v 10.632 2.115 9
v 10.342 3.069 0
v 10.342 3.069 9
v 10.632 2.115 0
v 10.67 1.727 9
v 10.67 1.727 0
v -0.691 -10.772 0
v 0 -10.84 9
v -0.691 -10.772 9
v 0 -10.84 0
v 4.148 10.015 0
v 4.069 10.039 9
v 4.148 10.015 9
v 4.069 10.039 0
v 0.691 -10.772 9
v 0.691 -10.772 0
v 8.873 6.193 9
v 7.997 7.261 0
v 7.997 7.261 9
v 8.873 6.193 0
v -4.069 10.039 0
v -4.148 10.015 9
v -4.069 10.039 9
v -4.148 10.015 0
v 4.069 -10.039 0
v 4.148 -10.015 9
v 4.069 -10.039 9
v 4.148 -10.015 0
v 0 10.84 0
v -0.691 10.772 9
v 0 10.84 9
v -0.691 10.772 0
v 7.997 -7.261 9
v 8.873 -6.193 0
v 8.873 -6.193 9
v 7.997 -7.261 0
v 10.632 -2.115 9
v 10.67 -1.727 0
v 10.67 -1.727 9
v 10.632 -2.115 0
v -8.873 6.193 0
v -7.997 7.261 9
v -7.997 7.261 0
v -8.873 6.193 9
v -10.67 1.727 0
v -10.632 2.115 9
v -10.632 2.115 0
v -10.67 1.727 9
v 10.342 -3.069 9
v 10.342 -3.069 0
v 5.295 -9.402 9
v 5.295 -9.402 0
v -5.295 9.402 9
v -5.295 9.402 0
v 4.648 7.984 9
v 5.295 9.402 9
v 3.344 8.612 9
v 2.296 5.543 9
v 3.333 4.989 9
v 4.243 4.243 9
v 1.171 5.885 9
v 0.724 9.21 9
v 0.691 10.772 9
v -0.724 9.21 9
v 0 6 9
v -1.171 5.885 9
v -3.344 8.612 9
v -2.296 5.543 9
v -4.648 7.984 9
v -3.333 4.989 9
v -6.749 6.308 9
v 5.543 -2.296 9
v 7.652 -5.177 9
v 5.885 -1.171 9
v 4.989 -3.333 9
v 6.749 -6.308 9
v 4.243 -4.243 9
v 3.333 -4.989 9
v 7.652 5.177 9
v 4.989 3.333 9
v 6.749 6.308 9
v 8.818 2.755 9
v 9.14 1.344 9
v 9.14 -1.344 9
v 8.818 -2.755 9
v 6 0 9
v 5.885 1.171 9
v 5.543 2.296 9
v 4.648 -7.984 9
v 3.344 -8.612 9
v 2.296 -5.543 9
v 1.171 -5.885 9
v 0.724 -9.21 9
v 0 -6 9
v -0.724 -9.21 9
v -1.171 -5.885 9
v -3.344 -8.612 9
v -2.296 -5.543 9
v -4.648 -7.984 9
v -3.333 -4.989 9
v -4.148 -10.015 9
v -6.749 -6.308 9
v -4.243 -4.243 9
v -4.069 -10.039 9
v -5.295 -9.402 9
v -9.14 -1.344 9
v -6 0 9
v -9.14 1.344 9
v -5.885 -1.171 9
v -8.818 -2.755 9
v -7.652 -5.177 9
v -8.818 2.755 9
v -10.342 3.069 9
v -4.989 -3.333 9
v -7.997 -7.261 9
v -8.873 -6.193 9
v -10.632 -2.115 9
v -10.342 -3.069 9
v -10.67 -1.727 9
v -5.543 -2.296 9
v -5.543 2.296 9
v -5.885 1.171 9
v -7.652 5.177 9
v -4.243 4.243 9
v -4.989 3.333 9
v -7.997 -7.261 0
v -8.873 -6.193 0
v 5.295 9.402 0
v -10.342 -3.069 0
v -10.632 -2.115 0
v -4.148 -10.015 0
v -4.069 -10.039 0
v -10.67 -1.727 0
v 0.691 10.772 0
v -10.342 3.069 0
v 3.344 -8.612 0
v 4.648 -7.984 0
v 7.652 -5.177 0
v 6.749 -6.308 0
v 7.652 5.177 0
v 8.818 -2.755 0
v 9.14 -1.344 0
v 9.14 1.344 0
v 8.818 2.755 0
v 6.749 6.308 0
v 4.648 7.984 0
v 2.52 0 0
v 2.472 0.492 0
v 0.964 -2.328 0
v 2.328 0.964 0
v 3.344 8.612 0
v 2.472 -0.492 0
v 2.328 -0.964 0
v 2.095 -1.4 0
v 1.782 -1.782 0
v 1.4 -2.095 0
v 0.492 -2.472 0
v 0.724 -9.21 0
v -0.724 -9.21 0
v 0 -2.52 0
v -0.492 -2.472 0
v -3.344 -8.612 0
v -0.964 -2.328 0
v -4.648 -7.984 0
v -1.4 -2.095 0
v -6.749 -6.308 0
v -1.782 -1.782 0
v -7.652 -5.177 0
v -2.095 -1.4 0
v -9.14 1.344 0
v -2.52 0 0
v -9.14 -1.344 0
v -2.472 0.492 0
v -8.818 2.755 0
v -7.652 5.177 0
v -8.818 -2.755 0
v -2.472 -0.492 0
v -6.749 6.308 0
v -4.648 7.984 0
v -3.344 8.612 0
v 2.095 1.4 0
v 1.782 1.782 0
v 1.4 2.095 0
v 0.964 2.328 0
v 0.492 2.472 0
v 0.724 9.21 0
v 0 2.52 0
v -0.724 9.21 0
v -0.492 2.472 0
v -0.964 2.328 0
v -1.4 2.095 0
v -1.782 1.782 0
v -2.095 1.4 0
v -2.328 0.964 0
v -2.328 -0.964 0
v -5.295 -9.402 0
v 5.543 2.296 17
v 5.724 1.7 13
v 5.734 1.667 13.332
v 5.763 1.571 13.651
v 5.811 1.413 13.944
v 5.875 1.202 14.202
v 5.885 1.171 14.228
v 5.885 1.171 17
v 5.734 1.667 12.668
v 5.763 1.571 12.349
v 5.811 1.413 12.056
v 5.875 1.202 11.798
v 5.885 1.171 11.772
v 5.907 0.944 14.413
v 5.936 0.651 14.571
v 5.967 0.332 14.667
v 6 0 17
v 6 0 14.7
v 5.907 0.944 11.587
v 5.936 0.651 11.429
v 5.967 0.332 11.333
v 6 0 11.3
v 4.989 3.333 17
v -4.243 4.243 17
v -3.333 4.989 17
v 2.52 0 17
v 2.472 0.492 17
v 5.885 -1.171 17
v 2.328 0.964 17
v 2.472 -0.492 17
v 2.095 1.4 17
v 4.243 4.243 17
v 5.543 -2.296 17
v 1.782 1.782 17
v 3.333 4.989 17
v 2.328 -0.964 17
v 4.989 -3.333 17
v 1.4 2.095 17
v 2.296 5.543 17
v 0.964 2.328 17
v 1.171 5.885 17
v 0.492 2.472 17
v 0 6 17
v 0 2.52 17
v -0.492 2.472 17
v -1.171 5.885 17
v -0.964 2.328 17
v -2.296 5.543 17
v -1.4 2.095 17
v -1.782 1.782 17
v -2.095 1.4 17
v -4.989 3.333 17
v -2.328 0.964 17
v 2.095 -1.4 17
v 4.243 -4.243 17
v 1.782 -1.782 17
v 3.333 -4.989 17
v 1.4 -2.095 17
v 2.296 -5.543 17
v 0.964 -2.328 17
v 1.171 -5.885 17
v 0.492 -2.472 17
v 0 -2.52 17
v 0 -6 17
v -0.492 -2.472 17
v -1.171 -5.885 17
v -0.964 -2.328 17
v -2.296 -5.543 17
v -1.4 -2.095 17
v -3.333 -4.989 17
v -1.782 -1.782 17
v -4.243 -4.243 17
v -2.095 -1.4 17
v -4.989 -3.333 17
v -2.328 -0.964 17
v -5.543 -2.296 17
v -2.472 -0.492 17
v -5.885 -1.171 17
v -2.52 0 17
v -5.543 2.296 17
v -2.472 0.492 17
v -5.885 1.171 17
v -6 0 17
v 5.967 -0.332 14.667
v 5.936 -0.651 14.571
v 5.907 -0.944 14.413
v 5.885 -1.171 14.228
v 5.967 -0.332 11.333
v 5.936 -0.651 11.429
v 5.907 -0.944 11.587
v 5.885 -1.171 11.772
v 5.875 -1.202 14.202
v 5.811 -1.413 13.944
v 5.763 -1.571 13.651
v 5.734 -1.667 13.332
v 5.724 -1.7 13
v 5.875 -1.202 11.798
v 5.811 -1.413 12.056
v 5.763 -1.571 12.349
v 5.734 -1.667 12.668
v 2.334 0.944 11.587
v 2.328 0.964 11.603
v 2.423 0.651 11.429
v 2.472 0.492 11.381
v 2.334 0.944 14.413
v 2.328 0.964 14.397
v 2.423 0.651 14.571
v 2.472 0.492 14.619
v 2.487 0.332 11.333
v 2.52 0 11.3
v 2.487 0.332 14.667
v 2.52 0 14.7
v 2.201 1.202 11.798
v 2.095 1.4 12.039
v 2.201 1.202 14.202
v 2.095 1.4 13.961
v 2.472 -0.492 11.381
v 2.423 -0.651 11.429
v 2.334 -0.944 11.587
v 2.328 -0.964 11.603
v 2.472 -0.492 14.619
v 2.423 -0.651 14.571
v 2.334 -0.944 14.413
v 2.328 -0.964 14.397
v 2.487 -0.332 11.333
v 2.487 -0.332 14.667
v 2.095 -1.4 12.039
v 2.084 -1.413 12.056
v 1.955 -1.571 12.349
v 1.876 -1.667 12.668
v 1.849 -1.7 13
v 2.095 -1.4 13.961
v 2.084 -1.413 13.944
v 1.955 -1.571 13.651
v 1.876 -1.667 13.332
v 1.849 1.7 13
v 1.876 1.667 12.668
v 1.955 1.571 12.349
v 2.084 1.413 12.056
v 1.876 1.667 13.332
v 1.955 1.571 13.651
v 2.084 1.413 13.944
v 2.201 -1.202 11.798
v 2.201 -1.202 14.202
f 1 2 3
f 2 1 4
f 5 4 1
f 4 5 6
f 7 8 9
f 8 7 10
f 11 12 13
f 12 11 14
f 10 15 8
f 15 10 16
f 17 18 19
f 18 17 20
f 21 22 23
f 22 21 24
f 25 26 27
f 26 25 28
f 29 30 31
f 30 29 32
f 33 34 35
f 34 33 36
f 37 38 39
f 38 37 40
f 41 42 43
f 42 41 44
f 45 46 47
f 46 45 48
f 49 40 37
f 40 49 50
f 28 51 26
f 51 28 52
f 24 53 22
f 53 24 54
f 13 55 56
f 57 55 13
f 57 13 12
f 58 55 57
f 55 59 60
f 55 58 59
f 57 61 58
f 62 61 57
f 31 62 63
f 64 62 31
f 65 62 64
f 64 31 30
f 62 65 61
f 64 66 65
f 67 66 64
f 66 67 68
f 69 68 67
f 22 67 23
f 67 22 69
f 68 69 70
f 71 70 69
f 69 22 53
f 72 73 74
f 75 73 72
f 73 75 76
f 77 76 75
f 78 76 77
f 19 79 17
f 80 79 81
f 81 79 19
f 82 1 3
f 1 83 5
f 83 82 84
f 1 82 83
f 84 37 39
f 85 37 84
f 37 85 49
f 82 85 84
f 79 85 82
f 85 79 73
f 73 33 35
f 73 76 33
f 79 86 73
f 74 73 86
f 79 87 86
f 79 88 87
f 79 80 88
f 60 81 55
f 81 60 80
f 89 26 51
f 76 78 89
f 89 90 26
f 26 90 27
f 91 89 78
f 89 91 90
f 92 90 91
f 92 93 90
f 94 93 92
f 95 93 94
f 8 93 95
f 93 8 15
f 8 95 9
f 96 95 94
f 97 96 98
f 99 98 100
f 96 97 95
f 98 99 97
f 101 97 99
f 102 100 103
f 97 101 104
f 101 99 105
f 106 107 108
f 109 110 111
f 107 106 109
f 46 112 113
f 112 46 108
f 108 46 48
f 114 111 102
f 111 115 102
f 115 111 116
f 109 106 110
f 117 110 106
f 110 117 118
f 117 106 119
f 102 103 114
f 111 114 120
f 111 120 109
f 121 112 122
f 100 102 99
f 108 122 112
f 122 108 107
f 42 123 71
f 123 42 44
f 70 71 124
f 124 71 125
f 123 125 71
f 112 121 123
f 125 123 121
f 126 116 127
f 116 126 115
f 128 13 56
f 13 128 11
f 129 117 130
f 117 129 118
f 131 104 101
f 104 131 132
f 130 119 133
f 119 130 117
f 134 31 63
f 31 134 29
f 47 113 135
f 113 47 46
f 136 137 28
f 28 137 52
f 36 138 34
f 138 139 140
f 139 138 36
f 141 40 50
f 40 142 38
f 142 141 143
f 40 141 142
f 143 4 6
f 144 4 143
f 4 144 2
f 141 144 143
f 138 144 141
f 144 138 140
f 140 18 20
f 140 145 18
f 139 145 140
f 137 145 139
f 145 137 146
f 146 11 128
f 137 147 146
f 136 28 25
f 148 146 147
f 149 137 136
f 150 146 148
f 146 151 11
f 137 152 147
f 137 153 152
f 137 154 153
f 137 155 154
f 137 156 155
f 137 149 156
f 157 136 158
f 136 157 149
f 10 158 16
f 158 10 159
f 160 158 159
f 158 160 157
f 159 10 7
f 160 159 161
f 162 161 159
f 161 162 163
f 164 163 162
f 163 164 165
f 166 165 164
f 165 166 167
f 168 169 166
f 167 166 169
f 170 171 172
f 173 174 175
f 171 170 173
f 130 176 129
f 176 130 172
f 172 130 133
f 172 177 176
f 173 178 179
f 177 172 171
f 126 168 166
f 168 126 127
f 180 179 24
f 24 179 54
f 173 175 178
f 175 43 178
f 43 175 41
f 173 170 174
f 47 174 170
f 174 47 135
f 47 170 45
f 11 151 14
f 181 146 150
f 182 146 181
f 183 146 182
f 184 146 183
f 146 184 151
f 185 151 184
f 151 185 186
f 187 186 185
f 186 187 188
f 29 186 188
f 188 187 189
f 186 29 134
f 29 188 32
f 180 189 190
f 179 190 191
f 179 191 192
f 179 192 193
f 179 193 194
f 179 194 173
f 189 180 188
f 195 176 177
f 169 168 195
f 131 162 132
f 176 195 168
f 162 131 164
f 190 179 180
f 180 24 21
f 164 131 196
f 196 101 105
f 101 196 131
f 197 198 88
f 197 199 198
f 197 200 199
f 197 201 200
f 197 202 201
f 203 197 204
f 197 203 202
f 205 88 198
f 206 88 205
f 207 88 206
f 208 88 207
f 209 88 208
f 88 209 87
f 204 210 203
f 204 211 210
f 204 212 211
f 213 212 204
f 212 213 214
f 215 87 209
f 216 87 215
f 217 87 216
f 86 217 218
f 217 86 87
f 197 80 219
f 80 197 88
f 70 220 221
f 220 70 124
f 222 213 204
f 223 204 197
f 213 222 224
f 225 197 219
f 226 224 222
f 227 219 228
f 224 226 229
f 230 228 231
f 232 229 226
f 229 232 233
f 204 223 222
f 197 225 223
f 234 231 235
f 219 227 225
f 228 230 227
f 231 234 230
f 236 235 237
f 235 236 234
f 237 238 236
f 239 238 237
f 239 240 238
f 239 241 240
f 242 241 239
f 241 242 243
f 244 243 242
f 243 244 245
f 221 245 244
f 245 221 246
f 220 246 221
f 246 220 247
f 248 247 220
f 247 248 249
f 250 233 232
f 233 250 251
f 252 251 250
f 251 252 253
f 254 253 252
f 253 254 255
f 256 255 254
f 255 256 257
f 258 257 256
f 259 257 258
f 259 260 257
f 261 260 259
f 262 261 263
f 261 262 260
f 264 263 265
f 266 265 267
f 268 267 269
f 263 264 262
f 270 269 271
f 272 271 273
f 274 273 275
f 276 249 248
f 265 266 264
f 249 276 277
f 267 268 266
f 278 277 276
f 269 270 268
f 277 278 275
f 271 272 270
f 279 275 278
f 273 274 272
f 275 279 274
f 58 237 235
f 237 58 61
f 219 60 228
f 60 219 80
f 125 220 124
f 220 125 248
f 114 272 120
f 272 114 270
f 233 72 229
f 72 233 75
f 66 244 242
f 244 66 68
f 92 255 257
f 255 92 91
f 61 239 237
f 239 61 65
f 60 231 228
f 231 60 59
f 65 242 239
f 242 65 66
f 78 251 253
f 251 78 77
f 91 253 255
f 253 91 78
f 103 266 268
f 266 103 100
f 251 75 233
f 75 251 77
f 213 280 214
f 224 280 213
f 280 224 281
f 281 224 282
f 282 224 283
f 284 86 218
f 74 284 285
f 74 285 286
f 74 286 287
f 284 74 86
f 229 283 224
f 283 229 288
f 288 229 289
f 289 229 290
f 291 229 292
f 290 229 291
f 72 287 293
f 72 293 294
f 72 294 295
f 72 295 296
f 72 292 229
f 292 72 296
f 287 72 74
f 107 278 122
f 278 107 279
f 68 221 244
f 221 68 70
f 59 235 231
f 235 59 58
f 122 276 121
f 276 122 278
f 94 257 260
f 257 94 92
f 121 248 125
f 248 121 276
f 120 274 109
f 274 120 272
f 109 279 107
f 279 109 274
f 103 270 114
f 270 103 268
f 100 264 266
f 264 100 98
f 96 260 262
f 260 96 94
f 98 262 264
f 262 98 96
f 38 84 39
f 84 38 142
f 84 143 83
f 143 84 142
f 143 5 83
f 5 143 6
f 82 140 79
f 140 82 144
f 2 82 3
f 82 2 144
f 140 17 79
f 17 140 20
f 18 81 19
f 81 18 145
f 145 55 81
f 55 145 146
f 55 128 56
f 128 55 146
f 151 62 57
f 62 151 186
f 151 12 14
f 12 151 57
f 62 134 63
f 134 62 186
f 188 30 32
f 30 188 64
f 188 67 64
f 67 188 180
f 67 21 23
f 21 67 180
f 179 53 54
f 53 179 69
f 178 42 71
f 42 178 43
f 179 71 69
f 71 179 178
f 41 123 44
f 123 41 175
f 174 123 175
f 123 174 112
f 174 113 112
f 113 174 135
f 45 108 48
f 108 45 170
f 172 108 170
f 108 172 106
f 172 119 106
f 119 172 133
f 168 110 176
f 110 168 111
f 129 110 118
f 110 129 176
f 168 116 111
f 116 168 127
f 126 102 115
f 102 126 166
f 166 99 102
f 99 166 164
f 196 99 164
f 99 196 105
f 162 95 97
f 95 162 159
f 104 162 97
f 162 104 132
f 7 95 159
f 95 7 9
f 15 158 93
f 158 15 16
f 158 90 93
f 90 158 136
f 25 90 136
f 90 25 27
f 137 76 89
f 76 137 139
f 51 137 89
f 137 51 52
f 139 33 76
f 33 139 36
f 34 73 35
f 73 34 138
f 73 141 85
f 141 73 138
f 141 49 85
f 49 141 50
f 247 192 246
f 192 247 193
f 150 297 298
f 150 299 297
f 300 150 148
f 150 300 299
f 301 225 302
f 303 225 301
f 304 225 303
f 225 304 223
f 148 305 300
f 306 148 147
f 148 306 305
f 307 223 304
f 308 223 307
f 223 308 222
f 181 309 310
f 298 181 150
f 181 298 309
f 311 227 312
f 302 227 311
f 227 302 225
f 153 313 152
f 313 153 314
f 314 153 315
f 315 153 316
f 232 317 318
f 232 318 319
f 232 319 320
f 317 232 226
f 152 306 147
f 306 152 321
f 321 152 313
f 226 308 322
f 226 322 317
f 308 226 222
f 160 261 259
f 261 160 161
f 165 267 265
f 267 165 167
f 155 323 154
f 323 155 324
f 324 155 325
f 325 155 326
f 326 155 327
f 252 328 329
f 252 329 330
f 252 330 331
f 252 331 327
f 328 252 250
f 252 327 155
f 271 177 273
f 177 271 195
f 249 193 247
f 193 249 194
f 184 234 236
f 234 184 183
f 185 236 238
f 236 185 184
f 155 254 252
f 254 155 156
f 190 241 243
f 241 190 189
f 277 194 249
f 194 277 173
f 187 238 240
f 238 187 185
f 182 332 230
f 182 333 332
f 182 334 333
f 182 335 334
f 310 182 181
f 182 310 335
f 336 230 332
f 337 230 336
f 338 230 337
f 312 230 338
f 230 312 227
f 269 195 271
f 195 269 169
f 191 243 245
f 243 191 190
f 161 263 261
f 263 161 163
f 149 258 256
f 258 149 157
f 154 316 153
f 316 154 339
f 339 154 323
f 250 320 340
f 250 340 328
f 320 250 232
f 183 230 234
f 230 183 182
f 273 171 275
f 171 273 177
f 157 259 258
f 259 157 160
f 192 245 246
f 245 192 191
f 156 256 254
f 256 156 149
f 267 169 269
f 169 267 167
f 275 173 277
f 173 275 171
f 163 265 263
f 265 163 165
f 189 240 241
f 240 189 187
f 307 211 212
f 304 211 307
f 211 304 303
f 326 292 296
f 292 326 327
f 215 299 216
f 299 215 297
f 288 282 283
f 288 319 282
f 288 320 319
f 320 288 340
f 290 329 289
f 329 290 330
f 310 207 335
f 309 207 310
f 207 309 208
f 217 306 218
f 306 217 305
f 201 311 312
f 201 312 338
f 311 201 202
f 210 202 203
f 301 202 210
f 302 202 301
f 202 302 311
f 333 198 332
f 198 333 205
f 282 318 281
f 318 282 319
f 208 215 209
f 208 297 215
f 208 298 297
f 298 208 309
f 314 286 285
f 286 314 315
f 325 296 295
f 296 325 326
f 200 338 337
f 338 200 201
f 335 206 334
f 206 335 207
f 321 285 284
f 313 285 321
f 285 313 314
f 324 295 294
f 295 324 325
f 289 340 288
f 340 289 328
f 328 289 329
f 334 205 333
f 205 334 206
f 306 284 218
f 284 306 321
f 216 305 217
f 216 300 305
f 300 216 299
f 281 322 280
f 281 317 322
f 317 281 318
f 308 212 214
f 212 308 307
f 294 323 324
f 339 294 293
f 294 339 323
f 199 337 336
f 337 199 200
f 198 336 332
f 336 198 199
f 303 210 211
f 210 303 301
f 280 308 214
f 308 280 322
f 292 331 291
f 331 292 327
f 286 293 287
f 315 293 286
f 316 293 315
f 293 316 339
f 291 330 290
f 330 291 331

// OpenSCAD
$fn = 32;

// ----------------------------------------------------------------------
// Timing pulley: HTD5 14T, pitch 5 mm, 21.68 mm x 17 mm
// ----------------------------------------------------------------------

// --- parameters (mm) ---
pitch_mm = 5;             // belt pitch
tooth_count = 14;         // number of grooves
width = 9;                // belt width between the flanges
tip_d = 21.68;            // tip circle diameter
root_d = 19.48;           // groove bottom diameter
groove_h = 1.1;           // groove depth
tooth_w = 3.2;            // groove width at the tip circle
hub_bore = 5.04;          // shaft bore
hub_d = 12;               // hub diameter
hub_h = 8;                // hub above the flange
bottom_z = 0;             // lowest point of the pulley
top_z = 17;               // highest point of the pulley
set_d = 3.4;              // set screw tap hole

module rim() {
  cylinder(h = width, d = tip_d);
}

module groove_cutter() {
  /* belt tooth groove: deeper than wide, cut through the belt width */
  translate([root_d / 2, 0, 0])
    linear_extrude(height = width)
      polygon(points = [[-0.6, -tooth_w * 0.42], [groove_h + 0.6, -tooth_w * 0.6],
                        [groove_h + 0.6, tooth_w * 0.6], [-0.6, tooth_w * 0.42]]);
}

module hub() {
  translate([0, 0, bottom_z]) cylinder(h = top_z - bottom_z, d = hub_d);
}

difference() {
  union() {
    rim();
    hub();
  }
  for (i = [0 : tooth_count - 1]) rotate([0, 0, i * 360 / tooth_count]) groove_cutter();
  translate([0, 0, bottom_z - 1]) cylinder(h = top_z - bottom_z + 2, d = hub_bore);
  translate([-1, 0, top_z - hub_h * 0.5]) rotate([0, 90, 0]) cylinder(h = hub_d / 2 + 3, d = set_d);
}
